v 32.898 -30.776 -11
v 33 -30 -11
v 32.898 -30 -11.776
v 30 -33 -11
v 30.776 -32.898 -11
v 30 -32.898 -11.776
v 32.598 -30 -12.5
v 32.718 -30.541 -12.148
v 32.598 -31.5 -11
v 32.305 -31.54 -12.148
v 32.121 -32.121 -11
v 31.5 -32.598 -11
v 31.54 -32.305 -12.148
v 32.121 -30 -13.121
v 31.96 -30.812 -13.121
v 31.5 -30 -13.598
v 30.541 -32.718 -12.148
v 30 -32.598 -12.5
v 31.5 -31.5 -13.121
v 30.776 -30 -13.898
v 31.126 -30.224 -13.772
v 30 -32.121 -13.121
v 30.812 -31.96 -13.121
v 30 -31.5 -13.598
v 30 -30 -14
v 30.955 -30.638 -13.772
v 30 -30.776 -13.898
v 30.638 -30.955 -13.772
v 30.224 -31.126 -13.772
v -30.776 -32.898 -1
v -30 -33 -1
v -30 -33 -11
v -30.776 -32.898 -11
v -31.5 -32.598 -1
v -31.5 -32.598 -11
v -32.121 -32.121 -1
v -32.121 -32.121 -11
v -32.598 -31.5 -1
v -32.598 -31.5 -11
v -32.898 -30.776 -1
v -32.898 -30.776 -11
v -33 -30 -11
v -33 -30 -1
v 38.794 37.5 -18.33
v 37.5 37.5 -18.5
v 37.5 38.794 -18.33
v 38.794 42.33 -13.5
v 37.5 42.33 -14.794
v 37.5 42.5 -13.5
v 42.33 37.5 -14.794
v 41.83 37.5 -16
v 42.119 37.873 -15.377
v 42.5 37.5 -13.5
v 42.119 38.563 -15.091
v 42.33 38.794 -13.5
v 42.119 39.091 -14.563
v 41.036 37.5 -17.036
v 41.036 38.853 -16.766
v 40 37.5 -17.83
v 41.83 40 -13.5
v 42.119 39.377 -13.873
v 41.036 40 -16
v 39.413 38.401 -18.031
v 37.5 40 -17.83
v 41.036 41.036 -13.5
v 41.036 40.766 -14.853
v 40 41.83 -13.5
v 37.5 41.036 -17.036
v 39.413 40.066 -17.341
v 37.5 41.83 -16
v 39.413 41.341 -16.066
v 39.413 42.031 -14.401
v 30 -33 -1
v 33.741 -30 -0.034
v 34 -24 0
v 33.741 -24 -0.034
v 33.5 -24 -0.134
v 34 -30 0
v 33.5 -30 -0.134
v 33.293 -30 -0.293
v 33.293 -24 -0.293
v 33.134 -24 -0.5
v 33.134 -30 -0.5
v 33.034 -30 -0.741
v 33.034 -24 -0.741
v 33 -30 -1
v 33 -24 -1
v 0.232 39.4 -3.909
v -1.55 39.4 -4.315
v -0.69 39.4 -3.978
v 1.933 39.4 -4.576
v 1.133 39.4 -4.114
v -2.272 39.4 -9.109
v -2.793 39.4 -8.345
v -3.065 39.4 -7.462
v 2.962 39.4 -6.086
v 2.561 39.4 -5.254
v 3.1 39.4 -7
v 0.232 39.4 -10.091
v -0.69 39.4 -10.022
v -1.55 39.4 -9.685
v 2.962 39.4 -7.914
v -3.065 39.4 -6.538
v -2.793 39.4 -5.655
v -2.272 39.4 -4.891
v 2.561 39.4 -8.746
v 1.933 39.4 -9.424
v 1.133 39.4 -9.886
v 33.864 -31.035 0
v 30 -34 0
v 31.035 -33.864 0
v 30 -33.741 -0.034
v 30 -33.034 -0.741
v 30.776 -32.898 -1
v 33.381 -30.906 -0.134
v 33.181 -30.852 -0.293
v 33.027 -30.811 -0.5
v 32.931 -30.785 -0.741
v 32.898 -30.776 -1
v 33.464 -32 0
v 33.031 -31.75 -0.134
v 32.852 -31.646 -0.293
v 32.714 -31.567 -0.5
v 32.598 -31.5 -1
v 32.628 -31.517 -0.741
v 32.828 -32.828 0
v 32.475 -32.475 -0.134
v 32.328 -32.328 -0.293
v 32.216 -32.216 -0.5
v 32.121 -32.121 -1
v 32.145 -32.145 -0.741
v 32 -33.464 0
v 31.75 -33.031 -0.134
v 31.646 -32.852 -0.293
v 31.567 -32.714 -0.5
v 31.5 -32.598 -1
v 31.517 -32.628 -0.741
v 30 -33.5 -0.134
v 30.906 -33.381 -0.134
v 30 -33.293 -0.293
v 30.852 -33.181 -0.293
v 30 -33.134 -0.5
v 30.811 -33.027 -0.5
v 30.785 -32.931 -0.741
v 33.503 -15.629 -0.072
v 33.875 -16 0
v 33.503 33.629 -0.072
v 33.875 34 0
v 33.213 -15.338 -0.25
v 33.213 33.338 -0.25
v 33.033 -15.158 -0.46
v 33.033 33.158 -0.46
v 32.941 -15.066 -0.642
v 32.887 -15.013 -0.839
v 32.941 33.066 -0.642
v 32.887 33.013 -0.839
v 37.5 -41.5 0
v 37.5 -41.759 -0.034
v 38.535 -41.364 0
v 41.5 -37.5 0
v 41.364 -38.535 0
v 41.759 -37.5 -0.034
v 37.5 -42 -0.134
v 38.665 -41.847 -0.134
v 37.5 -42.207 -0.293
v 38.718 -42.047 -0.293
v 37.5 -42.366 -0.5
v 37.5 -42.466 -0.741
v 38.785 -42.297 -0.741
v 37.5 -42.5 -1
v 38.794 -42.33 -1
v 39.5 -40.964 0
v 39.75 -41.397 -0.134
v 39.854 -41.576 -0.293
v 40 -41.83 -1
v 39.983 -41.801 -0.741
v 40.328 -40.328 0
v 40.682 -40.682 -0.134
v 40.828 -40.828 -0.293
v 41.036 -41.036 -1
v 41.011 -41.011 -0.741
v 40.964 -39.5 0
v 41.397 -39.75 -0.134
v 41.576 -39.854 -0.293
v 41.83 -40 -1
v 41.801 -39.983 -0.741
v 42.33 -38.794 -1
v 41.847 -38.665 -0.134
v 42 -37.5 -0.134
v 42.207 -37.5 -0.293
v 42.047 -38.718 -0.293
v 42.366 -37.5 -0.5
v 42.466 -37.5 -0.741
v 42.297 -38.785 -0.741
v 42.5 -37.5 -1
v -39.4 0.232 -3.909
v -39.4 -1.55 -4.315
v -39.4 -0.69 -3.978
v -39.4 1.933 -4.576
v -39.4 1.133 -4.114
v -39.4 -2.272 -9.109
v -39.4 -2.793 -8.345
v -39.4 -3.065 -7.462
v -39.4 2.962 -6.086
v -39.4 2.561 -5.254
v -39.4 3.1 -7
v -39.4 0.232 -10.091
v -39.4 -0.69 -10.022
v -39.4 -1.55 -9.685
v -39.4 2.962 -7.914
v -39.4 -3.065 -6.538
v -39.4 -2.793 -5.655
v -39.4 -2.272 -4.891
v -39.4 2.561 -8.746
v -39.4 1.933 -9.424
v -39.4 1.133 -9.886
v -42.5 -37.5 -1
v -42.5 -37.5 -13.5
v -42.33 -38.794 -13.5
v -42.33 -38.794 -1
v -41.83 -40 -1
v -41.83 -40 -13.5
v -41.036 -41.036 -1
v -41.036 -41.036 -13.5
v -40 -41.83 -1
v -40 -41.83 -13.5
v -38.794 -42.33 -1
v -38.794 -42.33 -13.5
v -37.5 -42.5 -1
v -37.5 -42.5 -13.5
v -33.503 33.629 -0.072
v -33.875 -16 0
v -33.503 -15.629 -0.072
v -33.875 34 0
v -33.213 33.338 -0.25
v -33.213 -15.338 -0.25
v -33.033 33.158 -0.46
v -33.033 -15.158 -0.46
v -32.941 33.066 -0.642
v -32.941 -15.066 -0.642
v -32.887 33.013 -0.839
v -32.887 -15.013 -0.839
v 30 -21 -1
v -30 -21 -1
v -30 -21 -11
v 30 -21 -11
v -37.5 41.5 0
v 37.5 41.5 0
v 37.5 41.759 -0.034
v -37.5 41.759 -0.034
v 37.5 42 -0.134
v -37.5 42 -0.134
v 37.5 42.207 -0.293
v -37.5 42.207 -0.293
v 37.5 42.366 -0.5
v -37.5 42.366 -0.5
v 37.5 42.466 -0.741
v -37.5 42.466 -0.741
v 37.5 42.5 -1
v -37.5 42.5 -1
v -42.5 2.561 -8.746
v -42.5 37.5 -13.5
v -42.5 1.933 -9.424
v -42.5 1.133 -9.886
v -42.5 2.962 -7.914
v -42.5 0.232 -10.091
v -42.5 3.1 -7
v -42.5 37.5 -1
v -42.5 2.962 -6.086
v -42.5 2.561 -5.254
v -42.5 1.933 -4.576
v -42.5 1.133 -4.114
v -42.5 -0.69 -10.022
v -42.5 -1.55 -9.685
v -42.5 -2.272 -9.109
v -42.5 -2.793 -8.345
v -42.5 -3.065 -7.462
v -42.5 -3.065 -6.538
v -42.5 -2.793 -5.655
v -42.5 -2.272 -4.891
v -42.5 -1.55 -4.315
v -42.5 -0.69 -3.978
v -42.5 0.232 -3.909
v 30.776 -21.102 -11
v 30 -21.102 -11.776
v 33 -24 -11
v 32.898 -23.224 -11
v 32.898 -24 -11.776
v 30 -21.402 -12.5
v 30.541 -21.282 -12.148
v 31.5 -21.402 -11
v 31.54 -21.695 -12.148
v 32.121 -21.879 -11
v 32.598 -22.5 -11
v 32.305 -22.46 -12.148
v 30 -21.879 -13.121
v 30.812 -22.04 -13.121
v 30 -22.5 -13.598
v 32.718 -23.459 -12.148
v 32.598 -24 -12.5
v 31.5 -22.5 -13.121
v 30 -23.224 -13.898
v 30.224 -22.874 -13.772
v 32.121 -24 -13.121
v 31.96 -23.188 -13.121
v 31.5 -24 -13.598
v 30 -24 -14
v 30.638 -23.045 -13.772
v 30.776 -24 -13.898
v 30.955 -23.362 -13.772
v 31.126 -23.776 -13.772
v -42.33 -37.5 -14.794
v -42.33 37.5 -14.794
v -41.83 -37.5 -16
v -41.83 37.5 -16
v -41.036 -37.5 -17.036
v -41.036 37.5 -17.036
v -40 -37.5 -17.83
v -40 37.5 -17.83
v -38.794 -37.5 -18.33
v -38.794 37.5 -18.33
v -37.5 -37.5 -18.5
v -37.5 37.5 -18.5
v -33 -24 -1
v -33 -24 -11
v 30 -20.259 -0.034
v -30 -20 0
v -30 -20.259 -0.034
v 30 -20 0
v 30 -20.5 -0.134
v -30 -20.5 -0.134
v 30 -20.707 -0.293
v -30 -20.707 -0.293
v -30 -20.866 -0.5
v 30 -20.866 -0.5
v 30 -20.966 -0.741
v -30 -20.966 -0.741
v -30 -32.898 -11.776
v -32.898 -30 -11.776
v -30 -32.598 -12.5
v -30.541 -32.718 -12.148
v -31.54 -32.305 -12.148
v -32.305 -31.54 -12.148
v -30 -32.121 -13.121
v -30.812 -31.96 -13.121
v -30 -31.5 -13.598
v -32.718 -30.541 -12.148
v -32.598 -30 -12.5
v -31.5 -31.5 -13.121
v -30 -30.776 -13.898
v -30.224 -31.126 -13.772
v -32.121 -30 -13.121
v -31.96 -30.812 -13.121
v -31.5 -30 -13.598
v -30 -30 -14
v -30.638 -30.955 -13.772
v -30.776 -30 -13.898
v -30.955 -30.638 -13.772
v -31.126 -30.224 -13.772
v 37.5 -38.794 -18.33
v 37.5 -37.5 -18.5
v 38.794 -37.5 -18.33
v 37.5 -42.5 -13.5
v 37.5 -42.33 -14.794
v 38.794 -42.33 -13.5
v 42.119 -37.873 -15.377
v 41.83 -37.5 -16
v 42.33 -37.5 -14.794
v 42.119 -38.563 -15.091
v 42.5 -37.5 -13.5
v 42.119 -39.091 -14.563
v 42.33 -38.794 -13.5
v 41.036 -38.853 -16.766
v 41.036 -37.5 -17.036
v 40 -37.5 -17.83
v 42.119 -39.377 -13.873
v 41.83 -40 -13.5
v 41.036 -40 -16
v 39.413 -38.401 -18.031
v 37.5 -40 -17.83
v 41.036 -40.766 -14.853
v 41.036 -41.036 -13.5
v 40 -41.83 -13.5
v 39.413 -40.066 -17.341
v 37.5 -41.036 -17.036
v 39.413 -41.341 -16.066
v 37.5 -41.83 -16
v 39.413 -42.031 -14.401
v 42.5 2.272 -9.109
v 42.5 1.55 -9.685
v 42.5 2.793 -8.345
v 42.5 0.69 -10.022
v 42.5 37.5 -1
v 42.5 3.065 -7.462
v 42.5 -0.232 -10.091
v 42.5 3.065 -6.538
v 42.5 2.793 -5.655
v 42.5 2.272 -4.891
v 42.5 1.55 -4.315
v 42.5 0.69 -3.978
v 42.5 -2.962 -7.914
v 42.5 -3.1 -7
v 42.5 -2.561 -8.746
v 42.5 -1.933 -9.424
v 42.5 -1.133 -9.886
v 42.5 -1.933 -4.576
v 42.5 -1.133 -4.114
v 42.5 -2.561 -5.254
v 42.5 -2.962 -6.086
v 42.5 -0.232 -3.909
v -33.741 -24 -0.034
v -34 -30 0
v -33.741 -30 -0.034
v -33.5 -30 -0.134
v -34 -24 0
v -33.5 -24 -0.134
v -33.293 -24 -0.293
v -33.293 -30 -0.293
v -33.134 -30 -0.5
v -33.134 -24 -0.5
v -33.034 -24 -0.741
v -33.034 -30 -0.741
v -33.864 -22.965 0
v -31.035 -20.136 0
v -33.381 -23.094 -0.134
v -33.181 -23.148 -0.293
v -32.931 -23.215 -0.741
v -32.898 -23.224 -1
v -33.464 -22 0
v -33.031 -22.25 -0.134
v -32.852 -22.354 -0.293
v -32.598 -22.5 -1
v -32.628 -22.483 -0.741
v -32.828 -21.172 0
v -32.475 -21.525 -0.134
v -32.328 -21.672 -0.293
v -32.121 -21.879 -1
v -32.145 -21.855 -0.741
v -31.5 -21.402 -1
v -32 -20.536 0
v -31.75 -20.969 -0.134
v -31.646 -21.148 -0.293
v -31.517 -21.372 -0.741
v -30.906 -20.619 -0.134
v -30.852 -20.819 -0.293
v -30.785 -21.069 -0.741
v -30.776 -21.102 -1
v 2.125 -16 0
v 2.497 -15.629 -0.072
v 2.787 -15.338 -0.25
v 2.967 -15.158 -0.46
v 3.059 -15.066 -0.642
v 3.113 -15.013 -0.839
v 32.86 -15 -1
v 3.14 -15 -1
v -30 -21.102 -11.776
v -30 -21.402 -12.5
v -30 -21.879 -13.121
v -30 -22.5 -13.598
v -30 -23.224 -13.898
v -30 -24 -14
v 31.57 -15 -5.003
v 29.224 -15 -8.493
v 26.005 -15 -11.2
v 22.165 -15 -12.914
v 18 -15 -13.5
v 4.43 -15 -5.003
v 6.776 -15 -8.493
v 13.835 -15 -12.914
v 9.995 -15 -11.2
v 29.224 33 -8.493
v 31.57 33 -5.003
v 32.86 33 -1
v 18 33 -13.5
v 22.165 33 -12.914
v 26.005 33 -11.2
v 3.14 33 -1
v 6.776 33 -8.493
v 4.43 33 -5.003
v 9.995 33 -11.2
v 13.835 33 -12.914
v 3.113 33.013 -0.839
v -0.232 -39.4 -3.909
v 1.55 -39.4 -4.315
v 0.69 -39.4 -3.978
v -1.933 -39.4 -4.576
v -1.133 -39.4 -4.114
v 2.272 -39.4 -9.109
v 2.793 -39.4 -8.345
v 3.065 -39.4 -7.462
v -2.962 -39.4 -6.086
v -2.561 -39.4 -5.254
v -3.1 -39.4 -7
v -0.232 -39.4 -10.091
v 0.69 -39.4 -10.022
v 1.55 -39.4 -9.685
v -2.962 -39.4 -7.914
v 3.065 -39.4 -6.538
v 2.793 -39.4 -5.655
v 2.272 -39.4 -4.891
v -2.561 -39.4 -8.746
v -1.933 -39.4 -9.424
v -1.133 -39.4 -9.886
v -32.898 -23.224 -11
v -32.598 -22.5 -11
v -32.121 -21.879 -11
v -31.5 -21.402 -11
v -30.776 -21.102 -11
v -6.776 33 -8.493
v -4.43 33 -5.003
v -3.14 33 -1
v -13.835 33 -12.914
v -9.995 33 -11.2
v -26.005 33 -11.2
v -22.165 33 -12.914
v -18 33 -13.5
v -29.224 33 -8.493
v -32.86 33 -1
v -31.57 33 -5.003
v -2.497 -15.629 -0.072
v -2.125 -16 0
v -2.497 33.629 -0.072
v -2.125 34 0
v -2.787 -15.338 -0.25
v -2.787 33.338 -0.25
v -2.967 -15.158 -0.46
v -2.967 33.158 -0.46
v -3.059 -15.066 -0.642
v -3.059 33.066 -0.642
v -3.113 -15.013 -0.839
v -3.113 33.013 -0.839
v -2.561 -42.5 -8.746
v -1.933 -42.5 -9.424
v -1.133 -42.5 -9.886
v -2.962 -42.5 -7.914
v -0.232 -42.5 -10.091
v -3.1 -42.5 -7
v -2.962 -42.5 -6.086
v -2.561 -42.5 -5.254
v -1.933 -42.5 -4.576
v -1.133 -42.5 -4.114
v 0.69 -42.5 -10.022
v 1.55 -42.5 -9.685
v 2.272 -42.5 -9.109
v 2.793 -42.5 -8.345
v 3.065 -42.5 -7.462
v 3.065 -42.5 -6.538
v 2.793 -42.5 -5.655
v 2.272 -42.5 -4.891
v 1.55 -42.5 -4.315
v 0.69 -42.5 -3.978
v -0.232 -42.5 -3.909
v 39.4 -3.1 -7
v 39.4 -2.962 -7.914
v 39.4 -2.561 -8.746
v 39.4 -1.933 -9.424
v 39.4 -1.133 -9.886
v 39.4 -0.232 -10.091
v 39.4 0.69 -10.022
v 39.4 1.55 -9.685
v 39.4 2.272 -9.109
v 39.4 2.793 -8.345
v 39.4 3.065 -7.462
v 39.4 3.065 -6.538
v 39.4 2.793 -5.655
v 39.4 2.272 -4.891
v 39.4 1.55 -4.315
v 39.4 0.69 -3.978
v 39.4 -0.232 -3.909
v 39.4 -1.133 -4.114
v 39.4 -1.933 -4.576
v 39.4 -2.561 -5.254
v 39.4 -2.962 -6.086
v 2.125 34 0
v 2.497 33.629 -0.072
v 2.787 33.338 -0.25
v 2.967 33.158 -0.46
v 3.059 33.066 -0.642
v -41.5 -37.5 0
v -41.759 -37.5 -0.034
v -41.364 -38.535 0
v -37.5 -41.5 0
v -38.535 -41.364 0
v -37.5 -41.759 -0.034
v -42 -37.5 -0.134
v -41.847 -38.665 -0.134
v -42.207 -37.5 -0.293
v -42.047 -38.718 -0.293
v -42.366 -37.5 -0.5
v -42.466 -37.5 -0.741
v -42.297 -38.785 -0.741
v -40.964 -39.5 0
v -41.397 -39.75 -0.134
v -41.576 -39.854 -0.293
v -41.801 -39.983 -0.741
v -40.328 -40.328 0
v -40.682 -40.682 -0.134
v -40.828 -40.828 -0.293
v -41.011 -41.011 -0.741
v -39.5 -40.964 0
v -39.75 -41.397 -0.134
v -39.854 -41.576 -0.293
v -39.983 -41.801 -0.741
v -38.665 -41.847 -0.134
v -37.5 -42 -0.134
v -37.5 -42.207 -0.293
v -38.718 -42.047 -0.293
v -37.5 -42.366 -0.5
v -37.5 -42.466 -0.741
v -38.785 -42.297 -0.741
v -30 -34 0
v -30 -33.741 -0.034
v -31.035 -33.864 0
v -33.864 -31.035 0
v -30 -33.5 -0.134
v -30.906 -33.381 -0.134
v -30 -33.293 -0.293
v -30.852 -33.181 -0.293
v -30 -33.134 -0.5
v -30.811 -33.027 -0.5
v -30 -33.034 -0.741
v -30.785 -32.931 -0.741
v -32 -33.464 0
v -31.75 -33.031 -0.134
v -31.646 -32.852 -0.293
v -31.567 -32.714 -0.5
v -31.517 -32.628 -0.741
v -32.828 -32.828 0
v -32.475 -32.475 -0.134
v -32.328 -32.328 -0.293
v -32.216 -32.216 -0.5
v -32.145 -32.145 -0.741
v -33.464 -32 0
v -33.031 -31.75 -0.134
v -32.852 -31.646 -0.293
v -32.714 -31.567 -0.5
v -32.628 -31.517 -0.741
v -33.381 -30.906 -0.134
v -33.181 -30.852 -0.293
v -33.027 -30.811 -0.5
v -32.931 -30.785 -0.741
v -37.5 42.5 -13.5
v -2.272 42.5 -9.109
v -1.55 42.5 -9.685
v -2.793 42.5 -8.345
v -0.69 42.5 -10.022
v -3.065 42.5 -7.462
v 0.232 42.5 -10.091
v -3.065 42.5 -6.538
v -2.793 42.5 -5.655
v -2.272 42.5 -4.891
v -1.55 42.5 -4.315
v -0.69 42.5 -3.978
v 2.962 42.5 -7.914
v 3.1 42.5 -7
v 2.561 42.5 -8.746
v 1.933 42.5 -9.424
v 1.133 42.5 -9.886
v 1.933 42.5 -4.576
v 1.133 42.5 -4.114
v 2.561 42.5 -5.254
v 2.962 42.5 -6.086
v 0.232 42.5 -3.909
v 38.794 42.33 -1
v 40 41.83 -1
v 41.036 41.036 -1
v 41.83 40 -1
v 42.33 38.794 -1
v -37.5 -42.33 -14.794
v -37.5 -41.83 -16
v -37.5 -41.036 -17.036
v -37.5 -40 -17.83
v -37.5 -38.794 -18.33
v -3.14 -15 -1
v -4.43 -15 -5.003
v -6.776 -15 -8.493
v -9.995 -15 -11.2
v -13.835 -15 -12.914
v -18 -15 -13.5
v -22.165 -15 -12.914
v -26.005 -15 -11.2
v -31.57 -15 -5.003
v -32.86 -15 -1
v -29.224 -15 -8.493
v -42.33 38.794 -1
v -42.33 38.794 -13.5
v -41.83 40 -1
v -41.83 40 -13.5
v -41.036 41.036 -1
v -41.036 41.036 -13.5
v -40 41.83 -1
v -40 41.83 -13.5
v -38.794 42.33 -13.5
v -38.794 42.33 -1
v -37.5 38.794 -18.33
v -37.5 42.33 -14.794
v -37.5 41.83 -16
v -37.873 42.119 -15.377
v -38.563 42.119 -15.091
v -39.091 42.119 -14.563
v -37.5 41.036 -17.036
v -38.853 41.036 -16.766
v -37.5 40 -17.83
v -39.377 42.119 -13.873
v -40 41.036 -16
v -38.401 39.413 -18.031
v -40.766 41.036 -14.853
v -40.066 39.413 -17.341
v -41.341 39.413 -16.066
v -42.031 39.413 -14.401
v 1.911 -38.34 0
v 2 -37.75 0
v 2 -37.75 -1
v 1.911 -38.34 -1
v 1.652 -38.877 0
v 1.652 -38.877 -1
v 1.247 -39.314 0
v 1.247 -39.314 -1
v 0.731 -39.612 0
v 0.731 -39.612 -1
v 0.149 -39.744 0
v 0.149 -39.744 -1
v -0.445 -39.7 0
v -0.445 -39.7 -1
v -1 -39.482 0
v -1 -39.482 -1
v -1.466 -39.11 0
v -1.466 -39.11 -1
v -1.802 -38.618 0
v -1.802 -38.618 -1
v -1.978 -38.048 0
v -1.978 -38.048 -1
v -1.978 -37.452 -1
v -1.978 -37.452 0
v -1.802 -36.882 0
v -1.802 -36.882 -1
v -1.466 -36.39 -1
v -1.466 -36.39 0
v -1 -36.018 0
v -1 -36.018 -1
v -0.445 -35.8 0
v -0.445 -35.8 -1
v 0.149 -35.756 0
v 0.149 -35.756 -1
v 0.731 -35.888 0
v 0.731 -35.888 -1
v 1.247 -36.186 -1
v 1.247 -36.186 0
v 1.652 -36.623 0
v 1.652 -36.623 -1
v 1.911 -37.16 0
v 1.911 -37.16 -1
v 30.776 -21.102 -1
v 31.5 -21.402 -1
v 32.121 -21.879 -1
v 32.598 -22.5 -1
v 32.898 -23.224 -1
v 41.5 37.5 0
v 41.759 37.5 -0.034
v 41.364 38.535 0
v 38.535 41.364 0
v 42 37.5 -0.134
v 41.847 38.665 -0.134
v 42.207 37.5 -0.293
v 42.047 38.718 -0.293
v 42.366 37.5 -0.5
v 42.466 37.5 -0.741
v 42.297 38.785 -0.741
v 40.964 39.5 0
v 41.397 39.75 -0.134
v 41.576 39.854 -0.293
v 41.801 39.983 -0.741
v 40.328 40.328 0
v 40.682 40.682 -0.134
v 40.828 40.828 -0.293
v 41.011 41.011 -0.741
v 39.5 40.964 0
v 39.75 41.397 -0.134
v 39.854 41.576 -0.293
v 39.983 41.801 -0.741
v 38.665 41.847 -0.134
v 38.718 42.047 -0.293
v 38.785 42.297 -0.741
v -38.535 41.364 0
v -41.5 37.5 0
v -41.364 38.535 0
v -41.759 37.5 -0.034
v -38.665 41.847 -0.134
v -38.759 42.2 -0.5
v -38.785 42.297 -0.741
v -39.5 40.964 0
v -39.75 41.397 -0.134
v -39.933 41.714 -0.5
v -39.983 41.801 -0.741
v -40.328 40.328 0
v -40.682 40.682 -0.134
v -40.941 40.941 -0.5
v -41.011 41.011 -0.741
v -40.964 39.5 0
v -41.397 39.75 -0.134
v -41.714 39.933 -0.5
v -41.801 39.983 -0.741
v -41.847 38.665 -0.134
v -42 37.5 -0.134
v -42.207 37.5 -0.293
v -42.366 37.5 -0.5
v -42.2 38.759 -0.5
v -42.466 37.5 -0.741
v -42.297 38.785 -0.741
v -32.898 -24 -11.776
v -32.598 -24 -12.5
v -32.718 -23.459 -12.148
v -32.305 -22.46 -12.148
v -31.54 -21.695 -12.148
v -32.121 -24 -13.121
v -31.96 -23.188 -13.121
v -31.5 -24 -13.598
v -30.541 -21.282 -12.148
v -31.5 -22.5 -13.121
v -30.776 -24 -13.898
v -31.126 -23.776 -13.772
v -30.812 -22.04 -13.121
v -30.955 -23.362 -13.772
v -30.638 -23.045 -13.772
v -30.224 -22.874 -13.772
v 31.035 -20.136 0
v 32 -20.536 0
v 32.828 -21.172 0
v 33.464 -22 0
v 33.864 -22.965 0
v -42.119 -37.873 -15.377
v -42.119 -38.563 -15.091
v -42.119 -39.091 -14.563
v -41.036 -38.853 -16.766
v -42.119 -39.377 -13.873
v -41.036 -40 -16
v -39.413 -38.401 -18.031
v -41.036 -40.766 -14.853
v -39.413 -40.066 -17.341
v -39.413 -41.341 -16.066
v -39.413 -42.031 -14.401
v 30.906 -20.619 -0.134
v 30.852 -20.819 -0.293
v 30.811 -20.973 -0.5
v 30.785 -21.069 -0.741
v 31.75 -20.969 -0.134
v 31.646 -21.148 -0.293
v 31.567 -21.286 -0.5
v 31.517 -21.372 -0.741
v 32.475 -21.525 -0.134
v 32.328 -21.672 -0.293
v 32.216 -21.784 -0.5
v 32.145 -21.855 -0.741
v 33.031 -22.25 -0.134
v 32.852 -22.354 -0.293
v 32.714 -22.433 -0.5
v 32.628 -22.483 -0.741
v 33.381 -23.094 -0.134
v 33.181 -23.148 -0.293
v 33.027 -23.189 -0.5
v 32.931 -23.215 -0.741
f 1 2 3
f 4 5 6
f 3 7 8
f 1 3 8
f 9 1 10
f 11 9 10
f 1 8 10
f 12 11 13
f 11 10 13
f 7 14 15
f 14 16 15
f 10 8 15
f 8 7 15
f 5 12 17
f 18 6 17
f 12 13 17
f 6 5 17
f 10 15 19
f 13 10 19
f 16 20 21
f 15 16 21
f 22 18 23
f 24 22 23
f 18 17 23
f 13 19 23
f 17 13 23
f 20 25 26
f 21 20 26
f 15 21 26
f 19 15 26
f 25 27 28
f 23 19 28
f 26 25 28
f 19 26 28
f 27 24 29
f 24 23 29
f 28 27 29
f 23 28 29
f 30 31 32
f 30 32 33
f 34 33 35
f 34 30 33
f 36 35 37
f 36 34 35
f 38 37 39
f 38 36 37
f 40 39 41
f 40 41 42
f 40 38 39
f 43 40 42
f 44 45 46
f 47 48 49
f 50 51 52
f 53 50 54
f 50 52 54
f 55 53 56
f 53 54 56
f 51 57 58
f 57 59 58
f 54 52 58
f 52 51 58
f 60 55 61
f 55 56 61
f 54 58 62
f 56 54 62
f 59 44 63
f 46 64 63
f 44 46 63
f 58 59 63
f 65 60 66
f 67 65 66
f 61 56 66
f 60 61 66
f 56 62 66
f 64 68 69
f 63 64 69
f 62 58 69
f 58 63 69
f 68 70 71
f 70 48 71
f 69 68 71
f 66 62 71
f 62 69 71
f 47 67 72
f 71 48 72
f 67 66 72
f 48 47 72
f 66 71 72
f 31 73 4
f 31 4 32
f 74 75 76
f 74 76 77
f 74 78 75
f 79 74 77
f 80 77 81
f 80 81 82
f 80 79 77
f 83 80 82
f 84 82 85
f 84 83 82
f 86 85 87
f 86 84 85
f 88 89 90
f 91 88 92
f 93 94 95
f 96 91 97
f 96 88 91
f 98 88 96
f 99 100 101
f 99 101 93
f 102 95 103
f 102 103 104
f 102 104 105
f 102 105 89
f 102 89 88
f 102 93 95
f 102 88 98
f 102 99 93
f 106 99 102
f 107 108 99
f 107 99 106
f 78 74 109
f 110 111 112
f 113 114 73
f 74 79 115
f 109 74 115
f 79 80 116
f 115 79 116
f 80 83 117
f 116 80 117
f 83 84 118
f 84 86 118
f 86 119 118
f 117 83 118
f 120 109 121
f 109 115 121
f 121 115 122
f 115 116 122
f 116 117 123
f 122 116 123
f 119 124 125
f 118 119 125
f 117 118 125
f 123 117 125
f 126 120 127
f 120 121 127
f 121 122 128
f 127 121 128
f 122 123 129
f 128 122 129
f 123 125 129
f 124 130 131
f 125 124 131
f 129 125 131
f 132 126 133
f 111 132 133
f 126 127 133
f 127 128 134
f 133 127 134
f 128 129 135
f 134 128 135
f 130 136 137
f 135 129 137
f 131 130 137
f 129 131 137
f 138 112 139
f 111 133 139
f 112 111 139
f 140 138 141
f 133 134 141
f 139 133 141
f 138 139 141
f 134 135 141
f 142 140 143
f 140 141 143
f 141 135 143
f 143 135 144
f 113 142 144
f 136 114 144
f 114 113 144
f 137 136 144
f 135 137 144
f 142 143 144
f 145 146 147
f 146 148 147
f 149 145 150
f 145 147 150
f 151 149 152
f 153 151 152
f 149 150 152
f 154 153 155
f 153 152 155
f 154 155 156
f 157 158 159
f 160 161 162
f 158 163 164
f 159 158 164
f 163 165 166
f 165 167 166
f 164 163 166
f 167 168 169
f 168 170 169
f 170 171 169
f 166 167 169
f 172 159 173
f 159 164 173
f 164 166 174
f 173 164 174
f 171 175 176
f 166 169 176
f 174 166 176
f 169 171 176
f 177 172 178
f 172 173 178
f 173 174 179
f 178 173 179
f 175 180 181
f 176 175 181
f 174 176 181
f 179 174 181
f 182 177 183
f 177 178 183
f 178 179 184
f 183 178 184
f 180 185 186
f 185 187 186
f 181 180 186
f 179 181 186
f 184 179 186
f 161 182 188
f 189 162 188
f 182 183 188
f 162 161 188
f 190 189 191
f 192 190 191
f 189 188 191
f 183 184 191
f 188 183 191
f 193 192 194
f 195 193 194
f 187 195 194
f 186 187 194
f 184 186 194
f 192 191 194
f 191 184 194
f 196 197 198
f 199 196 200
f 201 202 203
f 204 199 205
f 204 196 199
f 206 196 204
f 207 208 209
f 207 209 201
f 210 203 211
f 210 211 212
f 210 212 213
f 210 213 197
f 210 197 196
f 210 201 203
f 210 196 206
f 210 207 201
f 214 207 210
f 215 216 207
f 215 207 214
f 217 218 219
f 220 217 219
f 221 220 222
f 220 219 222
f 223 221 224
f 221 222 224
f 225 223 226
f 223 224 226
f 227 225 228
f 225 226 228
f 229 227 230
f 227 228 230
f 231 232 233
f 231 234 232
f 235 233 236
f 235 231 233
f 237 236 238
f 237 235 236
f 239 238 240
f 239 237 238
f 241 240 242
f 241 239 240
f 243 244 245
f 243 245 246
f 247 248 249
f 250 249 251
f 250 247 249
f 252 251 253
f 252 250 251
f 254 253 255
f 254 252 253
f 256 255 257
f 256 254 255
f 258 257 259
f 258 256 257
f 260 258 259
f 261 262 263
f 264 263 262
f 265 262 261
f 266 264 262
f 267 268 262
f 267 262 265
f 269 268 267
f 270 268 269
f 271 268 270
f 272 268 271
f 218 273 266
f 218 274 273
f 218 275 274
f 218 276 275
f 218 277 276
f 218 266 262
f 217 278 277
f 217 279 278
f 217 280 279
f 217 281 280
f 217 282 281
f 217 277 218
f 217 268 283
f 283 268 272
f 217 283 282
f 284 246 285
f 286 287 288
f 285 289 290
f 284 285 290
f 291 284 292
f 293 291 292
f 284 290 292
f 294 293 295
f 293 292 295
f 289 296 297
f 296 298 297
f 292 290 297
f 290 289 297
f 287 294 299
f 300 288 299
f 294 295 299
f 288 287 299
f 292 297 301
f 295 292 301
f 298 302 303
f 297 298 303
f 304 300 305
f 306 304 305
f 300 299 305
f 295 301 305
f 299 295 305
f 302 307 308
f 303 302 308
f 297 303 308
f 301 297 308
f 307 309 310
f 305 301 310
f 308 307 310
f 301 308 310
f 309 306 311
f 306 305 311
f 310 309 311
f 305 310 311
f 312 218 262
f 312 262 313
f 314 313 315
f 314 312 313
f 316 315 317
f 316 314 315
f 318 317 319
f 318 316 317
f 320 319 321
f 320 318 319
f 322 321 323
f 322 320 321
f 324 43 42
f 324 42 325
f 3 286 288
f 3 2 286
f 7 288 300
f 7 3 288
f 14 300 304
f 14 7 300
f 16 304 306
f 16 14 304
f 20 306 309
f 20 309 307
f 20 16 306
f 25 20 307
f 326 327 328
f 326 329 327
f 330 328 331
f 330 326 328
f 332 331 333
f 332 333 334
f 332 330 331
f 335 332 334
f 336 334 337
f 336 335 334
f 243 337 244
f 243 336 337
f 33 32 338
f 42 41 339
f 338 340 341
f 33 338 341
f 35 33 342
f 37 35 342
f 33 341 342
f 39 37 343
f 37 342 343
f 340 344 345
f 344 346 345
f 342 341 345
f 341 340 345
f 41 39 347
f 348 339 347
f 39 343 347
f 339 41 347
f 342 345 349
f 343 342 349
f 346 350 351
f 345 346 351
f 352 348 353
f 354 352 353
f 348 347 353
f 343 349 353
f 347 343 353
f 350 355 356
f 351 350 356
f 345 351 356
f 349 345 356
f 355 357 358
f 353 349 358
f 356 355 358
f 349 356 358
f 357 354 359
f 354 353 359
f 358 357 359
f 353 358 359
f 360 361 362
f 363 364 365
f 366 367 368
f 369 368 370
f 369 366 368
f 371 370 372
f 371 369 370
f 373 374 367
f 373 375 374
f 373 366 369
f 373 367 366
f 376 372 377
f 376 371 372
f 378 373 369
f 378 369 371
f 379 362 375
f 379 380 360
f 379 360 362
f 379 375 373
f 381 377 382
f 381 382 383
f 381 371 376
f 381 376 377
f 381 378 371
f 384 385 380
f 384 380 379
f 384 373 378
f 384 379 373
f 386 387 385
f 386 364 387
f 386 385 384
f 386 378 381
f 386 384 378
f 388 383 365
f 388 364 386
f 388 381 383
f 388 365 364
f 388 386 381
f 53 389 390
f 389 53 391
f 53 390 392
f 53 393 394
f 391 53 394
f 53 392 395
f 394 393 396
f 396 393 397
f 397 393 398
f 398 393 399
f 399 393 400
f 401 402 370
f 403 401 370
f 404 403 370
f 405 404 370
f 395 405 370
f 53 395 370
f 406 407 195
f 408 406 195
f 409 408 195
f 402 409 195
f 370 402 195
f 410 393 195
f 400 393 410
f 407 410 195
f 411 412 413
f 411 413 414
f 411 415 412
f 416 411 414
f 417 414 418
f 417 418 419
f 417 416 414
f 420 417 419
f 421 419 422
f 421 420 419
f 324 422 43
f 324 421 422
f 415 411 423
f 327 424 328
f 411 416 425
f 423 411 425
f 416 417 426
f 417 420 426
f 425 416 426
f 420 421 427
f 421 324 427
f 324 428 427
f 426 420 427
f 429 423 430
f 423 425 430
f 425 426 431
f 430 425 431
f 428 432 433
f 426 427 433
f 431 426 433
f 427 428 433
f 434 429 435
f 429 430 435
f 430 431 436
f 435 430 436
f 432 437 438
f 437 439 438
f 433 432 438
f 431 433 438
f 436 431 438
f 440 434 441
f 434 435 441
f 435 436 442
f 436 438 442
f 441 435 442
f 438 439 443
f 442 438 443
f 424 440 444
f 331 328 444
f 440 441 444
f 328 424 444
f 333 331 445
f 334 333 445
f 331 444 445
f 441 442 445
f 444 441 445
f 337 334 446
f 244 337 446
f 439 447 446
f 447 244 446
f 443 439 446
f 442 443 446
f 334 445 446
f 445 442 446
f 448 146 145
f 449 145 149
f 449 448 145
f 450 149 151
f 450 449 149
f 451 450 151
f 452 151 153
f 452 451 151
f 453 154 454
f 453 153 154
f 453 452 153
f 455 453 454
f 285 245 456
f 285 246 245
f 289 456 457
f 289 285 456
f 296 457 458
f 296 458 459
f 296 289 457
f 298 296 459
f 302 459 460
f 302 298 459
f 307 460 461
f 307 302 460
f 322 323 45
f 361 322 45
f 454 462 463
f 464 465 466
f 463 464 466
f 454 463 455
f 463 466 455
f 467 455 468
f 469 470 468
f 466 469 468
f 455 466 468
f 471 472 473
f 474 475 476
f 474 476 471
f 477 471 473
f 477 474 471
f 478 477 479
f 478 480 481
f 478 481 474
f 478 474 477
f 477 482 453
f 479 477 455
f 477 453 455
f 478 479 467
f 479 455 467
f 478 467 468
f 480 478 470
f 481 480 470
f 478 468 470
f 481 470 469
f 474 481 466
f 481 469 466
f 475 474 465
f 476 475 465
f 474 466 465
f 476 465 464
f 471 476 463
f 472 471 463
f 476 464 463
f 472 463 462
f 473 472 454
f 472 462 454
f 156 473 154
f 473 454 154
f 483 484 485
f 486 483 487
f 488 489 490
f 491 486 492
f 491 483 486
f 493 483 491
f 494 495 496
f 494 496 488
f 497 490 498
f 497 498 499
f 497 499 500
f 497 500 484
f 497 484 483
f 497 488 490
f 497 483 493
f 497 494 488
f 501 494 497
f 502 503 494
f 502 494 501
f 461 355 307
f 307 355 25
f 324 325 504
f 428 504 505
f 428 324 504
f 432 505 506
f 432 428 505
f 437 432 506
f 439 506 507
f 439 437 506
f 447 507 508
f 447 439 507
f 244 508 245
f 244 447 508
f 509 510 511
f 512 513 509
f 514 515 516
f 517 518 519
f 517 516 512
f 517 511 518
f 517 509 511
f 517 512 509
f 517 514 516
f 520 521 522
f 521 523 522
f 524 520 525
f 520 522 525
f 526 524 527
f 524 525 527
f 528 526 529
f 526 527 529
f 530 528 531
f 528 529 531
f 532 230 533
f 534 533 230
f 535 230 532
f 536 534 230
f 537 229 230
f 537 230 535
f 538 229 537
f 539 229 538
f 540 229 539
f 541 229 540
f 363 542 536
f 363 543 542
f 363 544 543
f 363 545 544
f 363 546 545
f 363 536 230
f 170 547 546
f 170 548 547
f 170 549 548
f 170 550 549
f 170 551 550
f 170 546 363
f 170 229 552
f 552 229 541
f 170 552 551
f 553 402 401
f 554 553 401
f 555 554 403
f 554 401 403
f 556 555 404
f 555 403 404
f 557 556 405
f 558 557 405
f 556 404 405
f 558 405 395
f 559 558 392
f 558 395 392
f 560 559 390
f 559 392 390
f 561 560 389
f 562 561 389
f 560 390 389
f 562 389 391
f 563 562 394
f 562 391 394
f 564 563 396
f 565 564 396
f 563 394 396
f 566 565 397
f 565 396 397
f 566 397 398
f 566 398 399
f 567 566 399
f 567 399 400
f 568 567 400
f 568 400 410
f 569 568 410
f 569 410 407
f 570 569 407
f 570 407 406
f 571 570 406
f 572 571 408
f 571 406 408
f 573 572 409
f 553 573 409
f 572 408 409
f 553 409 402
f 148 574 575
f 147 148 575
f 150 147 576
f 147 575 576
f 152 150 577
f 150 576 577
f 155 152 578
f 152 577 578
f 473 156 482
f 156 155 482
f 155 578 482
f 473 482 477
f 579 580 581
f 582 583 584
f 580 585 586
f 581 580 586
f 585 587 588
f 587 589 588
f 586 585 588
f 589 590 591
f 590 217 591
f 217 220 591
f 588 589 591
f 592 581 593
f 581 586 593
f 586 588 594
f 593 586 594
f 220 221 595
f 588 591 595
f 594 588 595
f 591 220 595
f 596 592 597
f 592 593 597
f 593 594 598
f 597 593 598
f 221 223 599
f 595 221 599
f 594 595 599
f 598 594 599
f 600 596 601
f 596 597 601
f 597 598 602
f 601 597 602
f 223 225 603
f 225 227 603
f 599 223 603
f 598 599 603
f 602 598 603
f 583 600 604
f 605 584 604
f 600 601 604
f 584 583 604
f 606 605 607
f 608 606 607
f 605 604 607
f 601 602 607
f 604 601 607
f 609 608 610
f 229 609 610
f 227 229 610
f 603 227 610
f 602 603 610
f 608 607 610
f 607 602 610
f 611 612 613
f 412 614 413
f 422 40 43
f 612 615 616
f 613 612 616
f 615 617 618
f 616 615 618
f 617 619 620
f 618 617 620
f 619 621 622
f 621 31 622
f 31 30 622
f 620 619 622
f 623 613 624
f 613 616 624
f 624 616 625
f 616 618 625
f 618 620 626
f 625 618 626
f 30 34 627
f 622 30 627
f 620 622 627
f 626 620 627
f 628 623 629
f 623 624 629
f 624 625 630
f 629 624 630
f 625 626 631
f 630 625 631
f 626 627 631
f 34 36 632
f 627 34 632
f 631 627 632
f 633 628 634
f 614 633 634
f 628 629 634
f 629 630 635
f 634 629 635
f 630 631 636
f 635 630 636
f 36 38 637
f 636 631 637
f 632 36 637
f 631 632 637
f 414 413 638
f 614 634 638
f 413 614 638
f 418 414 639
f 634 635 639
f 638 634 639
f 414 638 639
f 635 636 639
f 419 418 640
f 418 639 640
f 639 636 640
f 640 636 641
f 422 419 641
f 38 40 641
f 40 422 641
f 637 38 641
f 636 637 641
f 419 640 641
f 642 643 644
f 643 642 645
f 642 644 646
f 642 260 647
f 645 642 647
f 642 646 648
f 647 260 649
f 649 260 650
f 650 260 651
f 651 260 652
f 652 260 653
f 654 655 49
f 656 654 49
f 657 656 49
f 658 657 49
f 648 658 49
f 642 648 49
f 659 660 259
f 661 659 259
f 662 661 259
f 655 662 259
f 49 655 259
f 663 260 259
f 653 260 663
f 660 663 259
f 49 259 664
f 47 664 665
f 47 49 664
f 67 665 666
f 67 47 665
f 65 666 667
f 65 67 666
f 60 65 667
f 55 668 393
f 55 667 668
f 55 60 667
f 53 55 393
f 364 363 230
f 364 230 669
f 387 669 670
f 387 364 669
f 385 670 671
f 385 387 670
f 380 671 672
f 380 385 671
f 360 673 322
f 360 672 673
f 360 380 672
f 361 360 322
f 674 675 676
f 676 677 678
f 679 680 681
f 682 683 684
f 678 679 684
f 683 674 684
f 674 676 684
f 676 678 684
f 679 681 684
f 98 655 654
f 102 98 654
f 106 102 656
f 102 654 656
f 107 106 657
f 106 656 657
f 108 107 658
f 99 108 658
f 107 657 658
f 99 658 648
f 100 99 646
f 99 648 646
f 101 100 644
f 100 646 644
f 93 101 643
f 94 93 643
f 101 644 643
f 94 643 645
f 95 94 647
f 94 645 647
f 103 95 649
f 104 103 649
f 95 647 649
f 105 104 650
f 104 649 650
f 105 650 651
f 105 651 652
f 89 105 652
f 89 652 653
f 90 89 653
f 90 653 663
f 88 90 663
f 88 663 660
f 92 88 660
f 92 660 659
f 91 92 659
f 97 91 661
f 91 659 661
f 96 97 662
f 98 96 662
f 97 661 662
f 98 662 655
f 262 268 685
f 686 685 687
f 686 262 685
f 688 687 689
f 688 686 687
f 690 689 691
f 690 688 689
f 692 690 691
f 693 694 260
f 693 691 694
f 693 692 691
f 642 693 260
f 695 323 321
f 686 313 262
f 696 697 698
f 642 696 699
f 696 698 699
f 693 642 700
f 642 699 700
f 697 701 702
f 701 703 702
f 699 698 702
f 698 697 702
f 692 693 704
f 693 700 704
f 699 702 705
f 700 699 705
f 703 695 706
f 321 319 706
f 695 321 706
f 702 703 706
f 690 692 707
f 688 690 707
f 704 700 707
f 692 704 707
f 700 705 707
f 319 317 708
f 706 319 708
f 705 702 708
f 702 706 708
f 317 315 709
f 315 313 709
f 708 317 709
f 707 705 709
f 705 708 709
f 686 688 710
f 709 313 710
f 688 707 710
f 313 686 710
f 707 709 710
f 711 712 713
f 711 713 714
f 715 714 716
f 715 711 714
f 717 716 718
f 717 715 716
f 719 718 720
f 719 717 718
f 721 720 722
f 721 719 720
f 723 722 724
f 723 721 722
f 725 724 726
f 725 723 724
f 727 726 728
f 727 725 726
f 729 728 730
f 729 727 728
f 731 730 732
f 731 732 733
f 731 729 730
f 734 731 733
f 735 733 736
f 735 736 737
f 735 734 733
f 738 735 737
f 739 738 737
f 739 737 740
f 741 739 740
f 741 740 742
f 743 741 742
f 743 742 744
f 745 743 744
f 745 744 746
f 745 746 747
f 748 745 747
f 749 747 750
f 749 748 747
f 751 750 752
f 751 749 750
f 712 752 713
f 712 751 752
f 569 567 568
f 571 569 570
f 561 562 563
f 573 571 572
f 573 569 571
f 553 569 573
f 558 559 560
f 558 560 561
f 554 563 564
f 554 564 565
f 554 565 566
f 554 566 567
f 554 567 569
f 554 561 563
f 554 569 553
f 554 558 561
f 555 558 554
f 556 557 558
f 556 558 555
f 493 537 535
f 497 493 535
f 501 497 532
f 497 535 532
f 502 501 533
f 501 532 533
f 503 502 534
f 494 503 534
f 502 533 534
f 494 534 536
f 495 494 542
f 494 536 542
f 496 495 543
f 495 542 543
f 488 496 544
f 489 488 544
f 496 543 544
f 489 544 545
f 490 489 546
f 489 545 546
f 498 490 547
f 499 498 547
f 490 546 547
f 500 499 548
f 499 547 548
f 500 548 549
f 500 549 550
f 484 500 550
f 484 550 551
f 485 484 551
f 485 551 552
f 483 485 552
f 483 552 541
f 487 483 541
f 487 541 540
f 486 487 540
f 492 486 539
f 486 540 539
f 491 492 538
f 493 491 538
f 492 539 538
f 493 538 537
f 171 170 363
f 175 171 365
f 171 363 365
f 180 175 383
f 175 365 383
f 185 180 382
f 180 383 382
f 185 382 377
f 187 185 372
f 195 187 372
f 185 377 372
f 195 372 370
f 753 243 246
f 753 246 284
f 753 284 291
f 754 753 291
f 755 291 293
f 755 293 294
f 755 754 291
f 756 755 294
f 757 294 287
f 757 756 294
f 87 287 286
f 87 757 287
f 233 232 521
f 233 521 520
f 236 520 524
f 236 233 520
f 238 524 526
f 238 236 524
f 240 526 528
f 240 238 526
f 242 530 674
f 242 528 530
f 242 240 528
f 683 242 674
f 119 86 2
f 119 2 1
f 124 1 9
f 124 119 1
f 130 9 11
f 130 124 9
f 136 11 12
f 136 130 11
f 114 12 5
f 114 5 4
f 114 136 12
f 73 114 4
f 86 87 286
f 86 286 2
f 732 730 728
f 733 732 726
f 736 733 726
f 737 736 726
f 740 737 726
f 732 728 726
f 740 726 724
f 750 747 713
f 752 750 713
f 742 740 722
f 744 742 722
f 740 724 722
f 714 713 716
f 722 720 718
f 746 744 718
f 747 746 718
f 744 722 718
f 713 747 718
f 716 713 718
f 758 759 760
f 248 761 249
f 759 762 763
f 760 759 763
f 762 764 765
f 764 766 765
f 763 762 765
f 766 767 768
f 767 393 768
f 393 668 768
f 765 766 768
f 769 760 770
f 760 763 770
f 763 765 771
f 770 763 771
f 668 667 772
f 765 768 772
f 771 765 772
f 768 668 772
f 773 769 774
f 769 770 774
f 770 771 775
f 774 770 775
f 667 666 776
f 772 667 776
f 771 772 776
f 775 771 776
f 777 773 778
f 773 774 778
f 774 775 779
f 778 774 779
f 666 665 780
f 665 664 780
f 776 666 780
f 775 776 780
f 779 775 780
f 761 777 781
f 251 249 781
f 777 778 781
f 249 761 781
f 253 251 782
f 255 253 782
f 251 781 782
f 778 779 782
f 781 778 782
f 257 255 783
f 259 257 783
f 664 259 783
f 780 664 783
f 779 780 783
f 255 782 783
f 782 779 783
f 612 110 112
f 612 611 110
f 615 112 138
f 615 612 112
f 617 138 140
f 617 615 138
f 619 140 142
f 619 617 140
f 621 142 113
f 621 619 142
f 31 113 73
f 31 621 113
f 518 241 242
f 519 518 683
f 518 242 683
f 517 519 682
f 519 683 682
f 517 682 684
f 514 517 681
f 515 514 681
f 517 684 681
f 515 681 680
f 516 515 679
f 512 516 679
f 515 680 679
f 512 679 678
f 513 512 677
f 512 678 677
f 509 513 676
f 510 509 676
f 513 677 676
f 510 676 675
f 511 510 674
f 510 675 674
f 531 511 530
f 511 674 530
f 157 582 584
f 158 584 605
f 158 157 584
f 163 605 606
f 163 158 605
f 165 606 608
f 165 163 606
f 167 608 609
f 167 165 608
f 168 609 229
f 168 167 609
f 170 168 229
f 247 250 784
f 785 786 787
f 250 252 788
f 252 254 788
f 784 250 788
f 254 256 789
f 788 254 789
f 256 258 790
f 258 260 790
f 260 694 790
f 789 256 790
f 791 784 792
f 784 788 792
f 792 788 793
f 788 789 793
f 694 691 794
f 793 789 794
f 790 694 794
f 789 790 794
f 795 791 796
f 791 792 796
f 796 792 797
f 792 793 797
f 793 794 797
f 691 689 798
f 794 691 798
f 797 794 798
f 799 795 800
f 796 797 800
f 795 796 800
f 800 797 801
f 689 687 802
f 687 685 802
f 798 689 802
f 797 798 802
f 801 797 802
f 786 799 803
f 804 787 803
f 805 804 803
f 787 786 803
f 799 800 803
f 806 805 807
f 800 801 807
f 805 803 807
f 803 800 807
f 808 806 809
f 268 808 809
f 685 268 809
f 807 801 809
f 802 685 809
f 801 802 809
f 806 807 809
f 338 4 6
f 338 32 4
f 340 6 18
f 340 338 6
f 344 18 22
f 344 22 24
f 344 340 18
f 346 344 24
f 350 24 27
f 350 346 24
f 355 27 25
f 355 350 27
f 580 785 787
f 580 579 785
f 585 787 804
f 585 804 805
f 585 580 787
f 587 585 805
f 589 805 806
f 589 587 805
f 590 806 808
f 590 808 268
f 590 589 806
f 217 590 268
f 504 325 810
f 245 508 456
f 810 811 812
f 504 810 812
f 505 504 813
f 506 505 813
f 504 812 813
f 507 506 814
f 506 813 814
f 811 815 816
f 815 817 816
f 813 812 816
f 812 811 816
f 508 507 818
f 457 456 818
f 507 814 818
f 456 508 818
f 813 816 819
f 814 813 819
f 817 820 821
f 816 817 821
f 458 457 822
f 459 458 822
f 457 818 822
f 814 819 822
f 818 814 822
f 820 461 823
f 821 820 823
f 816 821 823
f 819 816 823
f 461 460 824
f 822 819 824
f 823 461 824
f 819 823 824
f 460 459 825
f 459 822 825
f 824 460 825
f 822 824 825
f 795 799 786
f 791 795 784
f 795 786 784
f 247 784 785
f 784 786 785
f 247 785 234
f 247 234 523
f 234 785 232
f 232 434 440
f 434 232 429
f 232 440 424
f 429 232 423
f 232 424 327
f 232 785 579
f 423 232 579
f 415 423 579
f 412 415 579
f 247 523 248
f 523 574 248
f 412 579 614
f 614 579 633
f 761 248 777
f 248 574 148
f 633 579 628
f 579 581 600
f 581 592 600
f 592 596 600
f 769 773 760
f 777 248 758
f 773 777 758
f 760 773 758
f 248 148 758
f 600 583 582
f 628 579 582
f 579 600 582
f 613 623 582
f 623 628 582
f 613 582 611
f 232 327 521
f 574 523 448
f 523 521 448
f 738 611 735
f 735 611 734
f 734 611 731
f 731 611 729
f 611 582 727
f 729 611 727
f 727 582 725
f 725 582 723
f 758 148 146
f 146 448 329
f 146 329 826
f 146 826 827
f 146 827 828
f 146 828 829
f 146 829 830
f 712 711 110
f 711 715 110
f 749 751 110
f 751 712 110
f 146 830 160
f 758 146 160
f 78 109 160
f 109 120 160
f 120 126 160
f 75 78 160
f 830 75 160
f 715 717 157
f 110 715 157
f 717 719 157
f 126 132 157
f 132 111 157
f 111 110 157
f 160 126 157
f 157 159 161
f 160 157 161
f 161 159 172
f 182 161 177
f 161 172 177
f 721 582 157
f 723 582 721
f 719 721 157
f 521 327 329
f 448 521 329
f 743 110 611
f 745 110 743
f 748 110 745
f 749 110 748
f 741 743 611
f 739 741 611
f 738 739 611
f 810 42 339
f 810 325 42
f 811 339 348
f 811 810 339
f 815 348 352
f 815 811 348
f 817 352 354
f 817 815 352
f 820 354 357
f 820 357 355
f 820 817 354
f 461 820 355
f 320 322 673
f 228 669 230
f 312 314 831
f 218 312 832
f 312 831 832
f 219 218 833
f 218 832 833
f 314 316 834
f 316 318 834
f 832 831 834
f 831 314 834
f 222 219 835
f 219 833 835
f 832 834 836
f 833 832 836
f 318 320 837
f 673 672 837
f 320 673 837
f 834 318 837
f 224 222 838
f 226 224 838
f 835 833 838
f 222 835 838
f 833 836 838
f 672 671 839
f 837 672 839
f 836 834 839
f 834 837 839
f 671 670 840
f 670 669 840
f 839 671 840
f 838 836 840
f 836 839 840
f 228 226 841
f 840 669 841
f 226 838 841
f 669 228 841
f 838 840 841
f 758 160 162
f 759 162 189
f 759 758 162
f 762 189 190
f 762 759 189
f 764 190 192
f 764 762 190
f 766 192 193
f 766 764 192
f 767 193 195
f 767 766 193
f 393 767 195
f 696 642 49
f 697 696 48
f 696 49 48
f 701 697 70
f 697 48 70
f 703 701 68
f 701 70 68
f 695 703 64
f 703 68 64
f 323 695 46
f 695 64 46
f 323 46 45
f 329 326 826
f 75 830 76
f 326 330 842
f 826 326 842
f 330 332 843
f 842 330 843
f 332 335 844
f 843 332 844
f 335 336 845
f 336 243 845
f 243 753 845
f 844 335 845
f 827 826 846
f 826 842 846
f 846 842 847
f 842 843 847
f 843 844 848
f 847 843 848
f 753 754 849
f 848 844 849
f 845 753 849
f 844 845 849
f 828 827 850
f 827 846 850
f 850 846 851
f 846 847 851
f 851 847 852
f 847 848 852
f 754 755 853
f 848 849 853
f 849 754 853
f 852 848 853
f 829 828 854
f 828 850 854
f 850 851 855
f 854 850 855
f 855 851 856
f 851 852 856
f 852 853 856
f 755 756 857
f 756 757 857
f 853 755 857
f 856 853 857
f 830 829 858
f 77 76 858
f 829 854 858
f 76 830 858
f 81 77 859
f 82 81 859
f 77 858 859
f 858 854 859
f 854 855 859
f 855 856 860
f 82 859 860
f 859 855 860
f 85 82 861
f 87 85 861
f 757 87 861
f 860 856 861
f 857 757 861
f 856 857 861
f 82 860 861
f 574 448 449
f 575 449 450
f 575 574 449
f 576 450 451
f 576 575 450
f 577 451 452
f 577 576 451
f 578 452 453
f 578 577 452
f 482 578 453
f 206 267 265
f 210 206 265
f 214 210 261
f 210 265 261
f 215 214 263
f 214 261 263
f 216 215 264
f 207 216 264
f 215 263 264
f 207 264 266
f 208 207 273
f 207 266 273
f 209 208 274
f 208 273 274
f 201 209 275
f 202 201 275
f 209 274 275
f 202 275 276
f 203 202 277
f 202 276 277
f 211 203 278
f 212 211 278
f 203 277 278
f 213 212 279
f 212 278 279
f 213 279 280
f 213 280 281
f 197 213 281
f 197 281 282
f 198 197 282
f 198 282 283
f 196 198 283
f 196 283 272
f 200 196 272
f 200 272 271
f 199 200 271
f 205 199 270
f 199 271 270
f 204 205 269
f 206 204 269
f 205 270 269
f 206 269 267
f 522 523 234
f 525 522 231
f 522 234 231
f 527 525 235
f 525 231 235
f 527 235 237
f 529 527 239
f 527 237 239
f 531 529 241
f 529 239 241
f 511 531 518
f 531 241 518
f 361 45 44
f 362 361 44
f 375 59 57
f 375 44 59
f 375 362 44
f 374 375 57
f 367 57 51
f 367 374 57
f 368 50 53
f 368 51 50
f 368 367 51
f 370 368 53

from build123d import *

# Parameters (mm, degrees)
F0_W      = 85
F0_H      = 85
F0_R      = 2
F3_DEPTH  = 18.5
F4_DEPTH  = 14
F5_R      = 5
F6_R      = 3
F7_R      = 3.1
F8_DEPTH  = 3.1
F9_R      = 3.1
F10_DEPTH = 3.1
F11_R     = 3.1
F12_DEPTH = 3.1
F13_R     = 3.1
F14_DEPTH = 3.1
F15_DEPTH = 1
F18_DEPTH = 48
F19_R     = 1
F20_ANGLE = 180


# Not quite as in the source:
# - a feature names something its author has since deleted; it is built from what else it names


with BuildPart() as f3:
    # F0 (on Top) → F3 (new body)
    with BuildSketch(Plane.XY):
        Rectangle(F0_W, F0_H)
        with BuildLine():
            ThreePointArc((-33, 30), (-32.1213203436, 32.1213203436), (-30, 33))
            Line((-30, 33), (30, 33))
            ThreePointArc((30, 33), (32.1213203436, 32.1213203436), (33, 30))
            Line((33, 30), (33, 24))
            ThreePointArc((33, 24), (32.1213203436, 21.8786796564), (30, 21))
            Line((30, 21), (-30, 21))
            ThreePointArc((-30, 21), (-32.1213203436, 21.8786796564), (-33, 24))
            Line((-33, 24), (-33, 30))
        make_face(mode=Mode.SUBTRACT)
        with Locations((0, 37.75)):
            Circle(F0_R, mode=Mode.SUBTRACT)
        with BuildLine():
            Line((30, 33), (-30, 33))
            ThreePointArc((-30, 33), (-32.1213203436, 32.1213203436), (-33, 30))
            Line((-33, 30), (-33, 24))
            ThreePointArc((-33, 24), (-32.1213203436, 21.8786796564), (-30, 21))
            Line((-30, 21), (30, 21))
            ThreePointArc((30, 21), (32.1213203436, 21.8786796564), (33, 24))
            Line((33, 24), (33, 30))
            ThreePointArc((33, 30), (32.1213203436, 32.1213203436), (30, 33))
        make_face()
        with Locations((0, 37.75)):
            Circle(F0_R)
    extrude(amount=F3_DEPTH)

    # F0 (on Top) → F4 (cut)
    with BuildSketch(Plane.XY):
        with BuildLine():
            Line((30, 33), (-30, 33))
            ThreePointArc((-30, 33), (-32.1213203436, 32.1213203436), (-33, 30))
            Line((-33, 30), (-33, 24))
            ThreePointArc((-33, 24), (-32.1213203436, 21.8786796564), (-30, 21))
            Line((-30, 21), (30, 21))
            ThreePointArc((30, 21), (32.1213203436, 21.8786796564), (33, 24))
            Line((33, 24), (33, 30))
            ThreePointArc((33, 30), (32.1213203436, 32.1213203436), (30, 33))
        make_face()
    extrude(amount=F4_DEPTH, mode=Mode.SUBTRACT)

    # F5
    f5_edges = [f3.edges().sort_by_distance(p)[0] for p in [
        (0, 42.5, 18.5),
        (-42.5, 0, 18.5),
        (0, -42.5, 18.5),
        (42.5, 0, 18.5),
        (42.5, 42.5, 9.25),
        (-42.5, 42.5, 9.25),
        (-42.5, -42.5, 9.25),
        (42.5, -42.5, 9.25),
    ]]
    fillet(f5_edges, radius=F5_R)

    # F6
    f6_edges = [f3.edges().sort_by_distance(p)[0] for p in [
        (0, 33, 14),
        (-32.12132, 32.12132, 14),
        (-33, 27, 14),
        (-32.12132, 21.87868, 14),
        (0, 21, 14),
        (32.12132, 21.87868, 14),
        (33, 27, 14),
        (32.12132, 32.12132, 14),
    ]]
    fillet(f6_edges, radius=F6_R)

    # F7 (on face) → F8 (cut)
    with BuildSketch(Plane.XZ.offset(42.5)):
        with Locations((0, 7)):
            Circle(F7_R)
    extrude(amount=-F8_DEPTH, mode=Mode.SUBTRACT)

    # F9 (on face) → F10 (cut)
    with BuildSketch(Plane(origin=(0, 42.5, 0), x_dir=(-1, 0, 0), z_dir=(0, 1, 0))):
        with Locations((0, 7)):
            Circle(F9_R)
    extrude(amount=-F10_DEPTH, mode=Mode.SUBTRACT)

    # F11 (on face) → F12 (cut)
    with BuildSketch(Plane(origin=(-42.5, 0, 0), x_dir=(0, -1, 0), z_dir=(-1, 0, 0))):
        with Locations((0, 7)):
            Circle(F11_R)
    extrude(amount=-F12_DEPTH, mode=Mode.SUBTRACT)

    # F13 (on face) → F14 (cut)
    with BuildSketch(Plane.YZ.offset(42.5)):
        with Locations((0, 7)):
            Circle(F13_R)
    extrude(amount=-F14_DEPTH, mode=Mode.SUBTRACT)

    # F0 (on Top) → F15 (cut)
    with BuildSketch(Plane.XY):
        with Locations((0, 37.75)):
            Circle(F0_R)
    extrude(amount=F15_DEPTH, mode=Mode.SUBTRACT)

    # F17 (on offset) → F18 (cut)
    with BuildSketch(Plane(origin=(0, 15, 0), x_dir=(-1, 0, 0), z_dir=(0, 1, 0))):
        with BuildLine():
            Line((-33, 0), (-3, 0))
            ThreePointArc((-3, 0), (-18, 13.5), (-33, 0))
        make_face()
        with BuildLine():
            Line((3, 0), (33, 0))
            ThreePointArc((33, 0), (18, 13.5), (3, 0))
        make_face()
    extrude(amount=-F18_DEPTH, mode=Mode.SUBTRACT)

    # F19
    f19_edges = [f3.edges().sort_by_distance(p)[0] for p in [
        (-42.5, 0, 0),
        (-33, -9, 0),
        (-18, 15, 0),
        (-3, -9, 0),
        (-18, -33, 0),
        (3, -9, 0),
        (18, -33, 0),
        (33, -9, 0),
        (18, 15, 0),
        (0, 21, 0),
    ]]
    fillet(f19_edges, radius=F19_R)


with BuildPart() as f3_1:
    # F20: moved
    add(f3.part.rotate(Axis((0, 0, 0), (1, 0, 0)), F20_ANGLE))


solid = f3_1.part
